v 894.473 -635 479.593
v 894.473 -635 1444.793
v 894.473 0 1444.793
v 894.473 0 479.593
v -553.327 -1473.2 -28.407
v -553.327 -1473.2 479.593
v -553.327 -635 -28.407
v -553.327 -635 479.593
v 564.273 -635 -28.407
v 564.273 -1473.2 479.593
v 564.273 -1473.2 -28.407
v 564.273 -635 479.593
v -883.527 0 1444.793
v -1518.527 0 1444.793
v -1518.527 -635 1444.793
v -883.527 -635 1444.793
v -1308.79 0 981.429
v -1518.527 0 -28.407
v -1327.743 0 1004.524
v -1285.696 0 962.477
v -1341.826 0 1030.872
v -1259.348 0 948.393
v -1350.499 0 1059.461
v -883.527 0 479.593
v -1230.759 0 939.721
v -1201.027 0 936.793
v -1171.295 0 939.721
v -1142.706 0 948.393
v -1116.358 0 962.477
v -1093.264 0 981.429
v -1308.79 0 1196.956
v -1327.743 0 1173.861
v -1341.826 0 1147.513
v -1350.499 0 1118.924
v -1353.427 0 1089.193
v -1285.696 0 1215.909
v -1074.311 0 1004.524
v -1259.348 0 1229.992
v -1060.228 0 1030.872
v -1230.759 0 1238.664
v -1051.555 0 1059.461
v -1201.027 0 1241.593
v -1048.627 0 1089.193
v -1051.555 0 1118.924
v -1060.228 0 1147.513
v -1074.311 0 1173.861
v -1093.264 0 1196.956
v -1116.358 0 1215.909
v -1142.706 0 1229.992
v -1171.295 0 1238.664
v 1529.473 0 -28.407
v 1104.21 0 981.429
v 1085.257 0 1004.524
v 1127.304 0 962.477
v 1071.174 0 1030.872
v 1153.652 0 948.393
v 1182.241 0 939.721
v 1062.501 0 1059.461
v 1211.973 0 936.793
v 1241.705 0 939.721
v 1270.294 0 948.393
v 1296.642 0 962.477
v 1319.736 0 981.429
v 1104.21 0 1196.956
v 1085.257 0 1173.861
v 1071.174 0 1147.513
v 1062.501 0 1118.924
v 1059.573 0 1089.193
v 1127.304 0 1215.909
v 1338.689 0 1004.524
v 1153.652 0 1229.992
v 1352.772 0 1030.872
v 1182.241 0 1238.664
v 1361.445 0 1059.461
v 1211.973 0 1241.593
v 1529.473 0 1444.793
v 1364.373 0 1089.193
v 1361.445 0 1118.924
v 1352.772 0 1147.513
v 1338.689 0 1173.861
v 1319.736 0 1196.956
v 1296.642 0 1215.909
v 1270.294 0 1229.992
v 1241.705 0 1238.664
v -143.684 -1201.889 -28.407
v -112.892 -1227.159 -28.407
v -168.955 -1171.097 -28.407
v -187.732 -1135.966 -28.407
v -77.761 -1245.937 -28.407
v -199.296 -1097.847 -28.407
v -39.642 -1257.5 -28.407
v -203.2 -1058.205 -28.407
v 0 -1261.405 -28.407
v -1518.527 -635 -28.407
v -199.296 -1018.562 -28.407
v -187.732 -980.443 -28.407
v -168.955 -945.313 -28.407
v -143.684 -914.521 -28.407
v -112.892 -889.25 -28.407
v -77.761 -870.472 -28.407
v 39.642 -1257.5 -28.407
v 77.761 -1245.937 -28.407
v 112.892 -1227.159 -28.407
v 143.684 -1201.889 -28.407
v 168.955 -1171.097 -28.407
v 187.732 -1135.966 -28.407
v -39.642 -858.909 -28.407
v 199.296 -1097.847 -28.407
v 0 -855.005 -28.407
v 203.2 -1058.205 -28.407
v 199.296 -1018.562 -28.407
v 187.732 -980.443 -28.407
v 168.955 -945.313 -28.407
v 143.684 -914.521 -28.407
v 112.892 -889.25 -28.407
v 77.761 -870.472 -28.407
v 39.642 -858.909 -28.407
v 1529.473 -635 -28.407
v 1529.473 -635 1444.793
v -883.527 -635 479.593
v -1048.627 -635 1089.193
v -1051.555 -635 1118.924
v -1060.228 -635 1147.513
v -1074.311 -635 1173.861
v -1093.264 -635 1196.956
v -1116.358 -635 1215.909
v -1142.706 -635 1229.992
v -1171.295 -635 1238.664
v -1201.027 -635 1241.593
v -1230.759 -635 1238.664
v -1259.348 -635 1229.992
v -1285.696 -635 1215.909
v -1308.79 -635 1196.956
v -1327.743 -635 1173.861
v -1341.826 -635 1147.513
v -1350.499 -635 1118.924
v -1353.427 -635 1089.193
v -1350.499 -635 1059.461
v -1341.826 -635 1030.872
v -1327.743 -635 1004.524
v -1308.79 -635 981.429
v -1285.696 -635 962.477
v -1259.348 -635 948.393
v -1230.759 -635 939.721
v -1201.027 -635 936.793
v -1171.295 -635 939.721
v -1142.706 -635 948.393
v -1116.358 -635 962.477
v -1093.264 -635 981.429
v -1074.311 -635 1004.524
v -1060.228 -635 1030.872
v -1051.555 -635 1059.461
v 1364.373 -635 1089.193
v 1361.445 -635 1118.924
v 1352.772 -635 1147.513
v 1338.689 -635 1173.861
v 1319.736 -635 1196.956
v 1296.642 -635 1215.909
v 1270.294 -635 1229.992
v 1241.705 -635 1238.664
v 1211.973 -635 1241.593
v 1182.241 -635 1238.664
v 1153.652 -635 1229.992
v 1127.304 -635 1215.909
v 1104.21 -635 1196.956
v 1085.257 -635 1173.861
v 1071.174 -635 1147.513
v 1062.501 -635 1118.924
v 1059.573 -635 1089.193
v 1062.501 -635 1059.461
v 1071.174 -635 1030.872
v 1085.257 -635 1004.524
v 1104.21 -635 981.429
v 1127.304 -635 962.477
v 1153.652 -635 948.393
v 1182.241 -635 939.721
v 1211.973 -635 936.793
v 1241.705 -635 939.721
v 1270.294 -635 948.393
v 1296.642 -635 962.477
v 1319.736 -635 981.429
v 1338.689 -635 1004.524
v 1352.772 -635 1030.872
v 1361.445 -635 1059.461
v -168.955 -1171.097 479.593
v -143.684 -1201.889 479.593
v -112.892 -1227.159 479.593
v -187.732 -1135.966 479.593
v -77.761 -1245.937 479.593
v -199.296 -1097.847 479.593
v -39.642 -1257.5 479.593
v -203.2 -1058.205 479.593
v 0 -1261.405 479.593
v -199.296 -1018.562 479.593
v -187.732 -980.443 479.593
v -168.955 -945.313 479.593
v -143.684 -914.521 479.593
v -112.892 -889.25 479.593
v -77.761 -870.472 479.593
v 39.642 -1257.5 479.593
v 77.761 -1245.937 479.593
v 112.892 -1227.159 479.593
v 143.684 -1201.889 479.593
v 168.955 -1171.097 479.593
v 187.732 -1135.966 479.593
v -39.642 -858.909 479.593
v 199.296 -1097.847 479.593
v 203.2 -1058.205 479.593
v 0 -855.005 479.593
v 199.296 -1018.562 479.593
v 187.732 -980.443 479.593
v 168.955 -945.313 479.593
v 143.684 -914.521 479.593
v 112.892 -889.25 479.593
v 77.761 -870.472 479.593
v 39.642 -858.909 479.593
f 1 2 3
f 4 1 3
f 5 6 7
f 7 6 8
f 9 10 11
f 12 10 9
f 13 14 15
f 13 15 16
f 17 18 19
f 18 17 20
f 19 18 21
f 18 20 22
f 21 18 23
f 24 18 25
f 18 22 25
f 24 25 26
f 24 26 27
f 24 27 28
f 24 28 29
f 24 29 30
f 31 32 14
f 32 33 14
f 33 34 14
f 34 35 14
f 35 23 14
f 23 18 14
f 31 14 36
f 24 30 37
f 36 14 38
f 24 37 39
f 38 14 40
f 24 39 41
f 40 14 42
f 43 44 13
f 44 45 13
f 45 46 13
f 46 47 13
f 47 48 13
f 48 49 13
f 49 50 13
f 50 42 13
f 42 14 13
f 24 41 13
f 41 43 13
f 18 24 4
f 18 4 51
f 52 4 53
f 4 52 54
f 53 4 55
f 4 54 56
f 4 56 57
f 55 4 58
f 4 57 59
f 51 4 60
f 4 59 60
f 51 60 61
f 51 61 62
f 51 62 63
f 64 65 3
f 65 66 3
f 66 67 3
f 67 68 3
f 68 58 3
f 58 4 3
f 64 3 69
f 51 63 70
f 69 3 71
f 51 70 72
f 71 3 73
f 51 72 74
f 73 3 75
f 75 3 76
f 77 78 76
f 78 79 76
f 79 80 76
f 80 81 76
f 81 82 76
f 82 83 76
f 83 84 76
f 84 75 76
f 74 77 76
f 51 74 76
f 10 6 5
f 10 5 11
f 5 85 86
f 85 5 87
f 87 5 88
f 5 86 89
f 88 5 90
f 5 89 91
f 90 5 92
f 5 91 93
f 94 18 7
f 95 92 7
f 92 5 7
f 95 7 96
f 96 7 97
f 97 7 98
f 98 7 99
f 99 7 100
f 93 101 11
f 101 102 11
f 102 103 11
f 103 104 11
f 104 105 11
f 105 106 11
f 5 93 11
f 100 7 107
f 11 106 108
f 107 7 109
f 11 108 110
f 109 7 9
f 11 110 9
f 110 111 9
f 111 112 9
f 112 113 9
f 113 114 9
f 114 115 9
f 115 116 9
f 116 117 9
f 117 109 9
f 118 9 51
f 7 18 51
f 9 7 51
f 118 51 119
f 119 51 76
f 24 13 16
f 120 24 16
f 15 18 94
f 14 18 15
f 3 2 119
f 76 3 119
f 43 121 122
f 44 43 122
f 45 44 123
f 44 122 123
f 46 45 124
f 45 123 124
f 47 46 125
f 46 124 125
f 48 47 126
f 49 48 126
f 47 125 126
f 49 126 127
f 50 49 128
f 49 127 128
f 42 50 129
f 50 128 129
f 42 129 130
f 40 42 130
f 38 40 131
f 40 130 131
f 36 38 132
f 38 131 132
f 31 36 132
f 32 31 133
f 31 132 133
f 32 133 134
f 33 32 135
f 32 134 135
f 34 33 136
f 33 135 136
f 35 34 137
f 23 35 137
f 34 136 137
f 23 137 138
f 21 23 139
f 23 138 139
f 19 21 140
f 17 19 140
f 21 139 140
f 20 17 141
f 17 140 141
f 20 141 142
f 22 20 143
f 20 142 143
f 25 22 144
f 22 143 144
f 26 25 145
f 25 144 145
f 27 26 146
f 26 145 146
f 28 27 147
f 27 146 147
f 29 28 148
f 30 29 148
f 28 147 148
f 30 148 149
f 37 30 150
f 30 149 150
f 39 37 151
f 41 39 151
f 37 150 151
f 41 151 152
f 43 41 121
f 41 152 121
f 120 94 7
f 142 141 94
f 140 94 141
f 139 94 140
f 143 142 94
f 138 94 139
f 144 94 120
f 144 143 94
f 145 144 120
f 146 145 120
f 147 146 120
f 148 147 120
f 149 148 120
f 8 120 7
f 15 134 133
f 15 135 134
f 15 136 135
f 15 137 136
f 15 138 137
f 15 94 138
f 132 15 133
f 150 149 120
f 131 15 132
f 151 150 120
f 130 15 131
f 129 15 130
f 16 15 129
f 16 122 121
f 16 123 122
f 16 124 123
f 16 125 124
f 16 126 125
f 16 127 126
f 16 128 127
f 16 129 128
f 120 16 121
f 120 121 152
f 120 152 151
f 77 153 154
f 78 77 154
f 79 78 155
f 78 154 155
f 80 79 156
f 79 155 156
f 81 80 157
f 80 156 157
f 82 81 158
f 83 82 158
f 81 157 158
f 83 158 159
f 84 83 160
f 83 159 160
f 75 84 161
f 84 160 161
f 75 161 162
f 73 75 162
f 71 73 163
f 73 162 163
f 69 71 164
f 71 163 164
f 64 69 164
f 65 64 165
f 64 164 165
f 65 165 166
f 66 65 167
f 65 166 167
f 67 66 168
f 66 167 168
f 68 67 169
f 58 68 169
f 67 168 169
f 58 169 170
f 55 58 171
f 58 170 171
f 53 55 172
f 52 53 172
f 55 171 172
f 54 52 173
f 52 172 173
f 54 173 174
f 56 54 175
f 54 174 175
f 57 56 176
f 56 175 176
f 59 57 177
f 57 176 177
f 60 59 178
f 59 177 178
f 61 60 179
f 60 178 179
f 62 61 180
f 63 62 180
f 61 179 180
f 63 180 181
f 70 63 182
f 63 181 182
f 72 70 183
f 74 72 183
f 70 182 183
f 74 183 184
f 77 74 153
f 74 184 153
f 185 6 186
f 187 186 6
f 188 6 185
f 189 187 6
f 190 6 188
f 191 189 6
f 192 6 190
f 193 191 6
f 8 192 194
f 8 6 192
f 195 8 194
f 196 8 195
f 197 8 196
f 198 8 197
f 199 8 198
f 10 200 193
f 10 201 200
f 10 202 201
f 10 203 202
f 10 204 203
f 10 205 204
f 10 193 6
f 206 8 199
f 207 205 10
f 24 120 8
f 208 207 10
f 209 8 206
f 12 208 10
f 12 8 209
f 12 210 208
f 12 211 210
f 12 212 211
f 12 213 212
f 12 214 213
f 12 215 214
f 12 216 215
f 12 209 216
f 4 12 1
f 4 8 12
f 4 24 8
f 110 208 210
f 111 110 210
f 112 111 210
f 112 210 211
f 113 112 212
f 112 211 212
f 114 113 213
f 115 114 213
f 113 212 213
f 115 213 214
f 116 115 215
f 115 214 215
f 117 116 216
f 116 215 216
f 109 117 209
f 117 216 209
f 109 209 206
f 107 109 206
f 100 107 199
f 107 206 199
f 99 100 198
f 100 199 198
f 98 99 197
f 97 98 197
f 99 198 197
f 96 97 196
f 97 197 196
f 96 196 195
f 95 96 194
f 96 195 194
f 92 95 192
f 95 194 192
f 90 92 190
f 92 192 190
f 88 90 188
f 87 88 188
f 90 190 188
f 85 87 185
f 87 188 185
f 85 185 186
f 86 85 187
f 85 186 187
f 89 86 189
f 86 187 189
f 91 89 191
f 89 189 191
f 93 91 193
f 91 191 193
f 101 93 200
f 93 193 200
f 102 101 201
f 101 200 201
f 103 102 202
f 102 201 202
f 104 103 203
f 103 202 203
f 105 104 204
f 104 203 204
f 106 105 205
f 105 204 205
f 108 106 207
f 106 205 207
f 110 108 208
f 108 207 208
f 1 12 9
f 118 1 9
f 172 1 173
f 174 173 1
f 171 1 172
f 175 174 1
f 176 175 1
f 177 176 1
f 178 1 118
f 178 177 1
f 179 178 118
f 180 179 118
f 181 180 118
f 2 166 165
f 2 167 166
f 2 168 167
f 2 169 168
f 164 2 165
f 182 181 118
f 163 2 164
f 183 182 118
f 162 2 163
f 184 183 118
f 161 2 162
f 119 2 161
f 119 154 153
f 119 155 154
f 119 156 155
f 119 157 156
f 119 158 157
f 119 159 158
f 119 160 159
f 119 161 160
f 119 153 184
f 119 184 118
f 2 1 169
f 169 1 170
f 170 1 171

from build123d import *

# Parameters (mm, degrees)
F0_W      = 3048
F0_H      = 1473.2
F1_DEPTH  = 1473.2
F2_W      = 965.2
F2_H      = 838.2
F3_DEPTH  = 1473.2
F5_DEPTH  = 965.2
F6_R      = 152.4
F7_DEPTH  = 635
F8_R      = 152.4
F9_DEPTH  = 635
F10_R     = 203.2
F11_DEPTH = 508


with BuildPart() as f1:
    # F0 (on Front) → F1 (new body)
    with BuildSketch(Plane.XZ):
        with Locations((5.472999, 708.19254)):
            Rectangle(F0_W, F0_H)
    extrude(amount=F1_DEPTH)

    # F2 (on face) → F3 (cut)
    with BuildSketch(Plane.XY.offset(1444.79254)):
        with Locations((1046.872999, -1054.1)):
            Rectangle(F2_W, F2_H)
        with Locations((-1035.927001, -1054.1)):
            Rectangle(F2_W, F2_H)
    extrude(amount=-F3_DEPTH, mode=Mode.SUBTRACT)

    # F4 (on face) → F5 (cut)
    with BuildSketch(Plane.XY.offset(1444.79254)):
        Polygon((894.472999, 0), (-883.527001, 0), (-883.527001, -635), (-553.327001, -635), (-553.327001, -1473.2), (564.272999, -1473.2), (564.272999, -635), (894.472999, -635), align=None)
    extrude(amount=-F5_DEPTH, mode=Mode.SUBTRACT)

    # F6 (on face) → F7 (cut)
    with BuildSketch(Plane.XZ.offset(635)):
        with Locations((-1201.027001, 1089.19254)):
            Circle(F6_R)
    extrude(amount=-F7_DEPTH, mode=Mode.SUBTRACT)

    # F8 (on face) → F9 (cut)
    with BuildSketch(Plane.XZ.offset(635)):
        with Locations((1211.972999, 1089.19254)):
            Circle(F8_R)
    extrude(amount=-F9_DEPTH, mode=Mode.SUBTRACT)

    # F10 (on face) → F11 (cut)
    with BuildSketch(Plane.XY.offset(479.59254)):
        with Locations((0, -1058.204749)):
            Circle(F10_R)
    extrude(amount=-F11_DEPTH, mode=Mode.SUBTRACT)


solid = f1.part
